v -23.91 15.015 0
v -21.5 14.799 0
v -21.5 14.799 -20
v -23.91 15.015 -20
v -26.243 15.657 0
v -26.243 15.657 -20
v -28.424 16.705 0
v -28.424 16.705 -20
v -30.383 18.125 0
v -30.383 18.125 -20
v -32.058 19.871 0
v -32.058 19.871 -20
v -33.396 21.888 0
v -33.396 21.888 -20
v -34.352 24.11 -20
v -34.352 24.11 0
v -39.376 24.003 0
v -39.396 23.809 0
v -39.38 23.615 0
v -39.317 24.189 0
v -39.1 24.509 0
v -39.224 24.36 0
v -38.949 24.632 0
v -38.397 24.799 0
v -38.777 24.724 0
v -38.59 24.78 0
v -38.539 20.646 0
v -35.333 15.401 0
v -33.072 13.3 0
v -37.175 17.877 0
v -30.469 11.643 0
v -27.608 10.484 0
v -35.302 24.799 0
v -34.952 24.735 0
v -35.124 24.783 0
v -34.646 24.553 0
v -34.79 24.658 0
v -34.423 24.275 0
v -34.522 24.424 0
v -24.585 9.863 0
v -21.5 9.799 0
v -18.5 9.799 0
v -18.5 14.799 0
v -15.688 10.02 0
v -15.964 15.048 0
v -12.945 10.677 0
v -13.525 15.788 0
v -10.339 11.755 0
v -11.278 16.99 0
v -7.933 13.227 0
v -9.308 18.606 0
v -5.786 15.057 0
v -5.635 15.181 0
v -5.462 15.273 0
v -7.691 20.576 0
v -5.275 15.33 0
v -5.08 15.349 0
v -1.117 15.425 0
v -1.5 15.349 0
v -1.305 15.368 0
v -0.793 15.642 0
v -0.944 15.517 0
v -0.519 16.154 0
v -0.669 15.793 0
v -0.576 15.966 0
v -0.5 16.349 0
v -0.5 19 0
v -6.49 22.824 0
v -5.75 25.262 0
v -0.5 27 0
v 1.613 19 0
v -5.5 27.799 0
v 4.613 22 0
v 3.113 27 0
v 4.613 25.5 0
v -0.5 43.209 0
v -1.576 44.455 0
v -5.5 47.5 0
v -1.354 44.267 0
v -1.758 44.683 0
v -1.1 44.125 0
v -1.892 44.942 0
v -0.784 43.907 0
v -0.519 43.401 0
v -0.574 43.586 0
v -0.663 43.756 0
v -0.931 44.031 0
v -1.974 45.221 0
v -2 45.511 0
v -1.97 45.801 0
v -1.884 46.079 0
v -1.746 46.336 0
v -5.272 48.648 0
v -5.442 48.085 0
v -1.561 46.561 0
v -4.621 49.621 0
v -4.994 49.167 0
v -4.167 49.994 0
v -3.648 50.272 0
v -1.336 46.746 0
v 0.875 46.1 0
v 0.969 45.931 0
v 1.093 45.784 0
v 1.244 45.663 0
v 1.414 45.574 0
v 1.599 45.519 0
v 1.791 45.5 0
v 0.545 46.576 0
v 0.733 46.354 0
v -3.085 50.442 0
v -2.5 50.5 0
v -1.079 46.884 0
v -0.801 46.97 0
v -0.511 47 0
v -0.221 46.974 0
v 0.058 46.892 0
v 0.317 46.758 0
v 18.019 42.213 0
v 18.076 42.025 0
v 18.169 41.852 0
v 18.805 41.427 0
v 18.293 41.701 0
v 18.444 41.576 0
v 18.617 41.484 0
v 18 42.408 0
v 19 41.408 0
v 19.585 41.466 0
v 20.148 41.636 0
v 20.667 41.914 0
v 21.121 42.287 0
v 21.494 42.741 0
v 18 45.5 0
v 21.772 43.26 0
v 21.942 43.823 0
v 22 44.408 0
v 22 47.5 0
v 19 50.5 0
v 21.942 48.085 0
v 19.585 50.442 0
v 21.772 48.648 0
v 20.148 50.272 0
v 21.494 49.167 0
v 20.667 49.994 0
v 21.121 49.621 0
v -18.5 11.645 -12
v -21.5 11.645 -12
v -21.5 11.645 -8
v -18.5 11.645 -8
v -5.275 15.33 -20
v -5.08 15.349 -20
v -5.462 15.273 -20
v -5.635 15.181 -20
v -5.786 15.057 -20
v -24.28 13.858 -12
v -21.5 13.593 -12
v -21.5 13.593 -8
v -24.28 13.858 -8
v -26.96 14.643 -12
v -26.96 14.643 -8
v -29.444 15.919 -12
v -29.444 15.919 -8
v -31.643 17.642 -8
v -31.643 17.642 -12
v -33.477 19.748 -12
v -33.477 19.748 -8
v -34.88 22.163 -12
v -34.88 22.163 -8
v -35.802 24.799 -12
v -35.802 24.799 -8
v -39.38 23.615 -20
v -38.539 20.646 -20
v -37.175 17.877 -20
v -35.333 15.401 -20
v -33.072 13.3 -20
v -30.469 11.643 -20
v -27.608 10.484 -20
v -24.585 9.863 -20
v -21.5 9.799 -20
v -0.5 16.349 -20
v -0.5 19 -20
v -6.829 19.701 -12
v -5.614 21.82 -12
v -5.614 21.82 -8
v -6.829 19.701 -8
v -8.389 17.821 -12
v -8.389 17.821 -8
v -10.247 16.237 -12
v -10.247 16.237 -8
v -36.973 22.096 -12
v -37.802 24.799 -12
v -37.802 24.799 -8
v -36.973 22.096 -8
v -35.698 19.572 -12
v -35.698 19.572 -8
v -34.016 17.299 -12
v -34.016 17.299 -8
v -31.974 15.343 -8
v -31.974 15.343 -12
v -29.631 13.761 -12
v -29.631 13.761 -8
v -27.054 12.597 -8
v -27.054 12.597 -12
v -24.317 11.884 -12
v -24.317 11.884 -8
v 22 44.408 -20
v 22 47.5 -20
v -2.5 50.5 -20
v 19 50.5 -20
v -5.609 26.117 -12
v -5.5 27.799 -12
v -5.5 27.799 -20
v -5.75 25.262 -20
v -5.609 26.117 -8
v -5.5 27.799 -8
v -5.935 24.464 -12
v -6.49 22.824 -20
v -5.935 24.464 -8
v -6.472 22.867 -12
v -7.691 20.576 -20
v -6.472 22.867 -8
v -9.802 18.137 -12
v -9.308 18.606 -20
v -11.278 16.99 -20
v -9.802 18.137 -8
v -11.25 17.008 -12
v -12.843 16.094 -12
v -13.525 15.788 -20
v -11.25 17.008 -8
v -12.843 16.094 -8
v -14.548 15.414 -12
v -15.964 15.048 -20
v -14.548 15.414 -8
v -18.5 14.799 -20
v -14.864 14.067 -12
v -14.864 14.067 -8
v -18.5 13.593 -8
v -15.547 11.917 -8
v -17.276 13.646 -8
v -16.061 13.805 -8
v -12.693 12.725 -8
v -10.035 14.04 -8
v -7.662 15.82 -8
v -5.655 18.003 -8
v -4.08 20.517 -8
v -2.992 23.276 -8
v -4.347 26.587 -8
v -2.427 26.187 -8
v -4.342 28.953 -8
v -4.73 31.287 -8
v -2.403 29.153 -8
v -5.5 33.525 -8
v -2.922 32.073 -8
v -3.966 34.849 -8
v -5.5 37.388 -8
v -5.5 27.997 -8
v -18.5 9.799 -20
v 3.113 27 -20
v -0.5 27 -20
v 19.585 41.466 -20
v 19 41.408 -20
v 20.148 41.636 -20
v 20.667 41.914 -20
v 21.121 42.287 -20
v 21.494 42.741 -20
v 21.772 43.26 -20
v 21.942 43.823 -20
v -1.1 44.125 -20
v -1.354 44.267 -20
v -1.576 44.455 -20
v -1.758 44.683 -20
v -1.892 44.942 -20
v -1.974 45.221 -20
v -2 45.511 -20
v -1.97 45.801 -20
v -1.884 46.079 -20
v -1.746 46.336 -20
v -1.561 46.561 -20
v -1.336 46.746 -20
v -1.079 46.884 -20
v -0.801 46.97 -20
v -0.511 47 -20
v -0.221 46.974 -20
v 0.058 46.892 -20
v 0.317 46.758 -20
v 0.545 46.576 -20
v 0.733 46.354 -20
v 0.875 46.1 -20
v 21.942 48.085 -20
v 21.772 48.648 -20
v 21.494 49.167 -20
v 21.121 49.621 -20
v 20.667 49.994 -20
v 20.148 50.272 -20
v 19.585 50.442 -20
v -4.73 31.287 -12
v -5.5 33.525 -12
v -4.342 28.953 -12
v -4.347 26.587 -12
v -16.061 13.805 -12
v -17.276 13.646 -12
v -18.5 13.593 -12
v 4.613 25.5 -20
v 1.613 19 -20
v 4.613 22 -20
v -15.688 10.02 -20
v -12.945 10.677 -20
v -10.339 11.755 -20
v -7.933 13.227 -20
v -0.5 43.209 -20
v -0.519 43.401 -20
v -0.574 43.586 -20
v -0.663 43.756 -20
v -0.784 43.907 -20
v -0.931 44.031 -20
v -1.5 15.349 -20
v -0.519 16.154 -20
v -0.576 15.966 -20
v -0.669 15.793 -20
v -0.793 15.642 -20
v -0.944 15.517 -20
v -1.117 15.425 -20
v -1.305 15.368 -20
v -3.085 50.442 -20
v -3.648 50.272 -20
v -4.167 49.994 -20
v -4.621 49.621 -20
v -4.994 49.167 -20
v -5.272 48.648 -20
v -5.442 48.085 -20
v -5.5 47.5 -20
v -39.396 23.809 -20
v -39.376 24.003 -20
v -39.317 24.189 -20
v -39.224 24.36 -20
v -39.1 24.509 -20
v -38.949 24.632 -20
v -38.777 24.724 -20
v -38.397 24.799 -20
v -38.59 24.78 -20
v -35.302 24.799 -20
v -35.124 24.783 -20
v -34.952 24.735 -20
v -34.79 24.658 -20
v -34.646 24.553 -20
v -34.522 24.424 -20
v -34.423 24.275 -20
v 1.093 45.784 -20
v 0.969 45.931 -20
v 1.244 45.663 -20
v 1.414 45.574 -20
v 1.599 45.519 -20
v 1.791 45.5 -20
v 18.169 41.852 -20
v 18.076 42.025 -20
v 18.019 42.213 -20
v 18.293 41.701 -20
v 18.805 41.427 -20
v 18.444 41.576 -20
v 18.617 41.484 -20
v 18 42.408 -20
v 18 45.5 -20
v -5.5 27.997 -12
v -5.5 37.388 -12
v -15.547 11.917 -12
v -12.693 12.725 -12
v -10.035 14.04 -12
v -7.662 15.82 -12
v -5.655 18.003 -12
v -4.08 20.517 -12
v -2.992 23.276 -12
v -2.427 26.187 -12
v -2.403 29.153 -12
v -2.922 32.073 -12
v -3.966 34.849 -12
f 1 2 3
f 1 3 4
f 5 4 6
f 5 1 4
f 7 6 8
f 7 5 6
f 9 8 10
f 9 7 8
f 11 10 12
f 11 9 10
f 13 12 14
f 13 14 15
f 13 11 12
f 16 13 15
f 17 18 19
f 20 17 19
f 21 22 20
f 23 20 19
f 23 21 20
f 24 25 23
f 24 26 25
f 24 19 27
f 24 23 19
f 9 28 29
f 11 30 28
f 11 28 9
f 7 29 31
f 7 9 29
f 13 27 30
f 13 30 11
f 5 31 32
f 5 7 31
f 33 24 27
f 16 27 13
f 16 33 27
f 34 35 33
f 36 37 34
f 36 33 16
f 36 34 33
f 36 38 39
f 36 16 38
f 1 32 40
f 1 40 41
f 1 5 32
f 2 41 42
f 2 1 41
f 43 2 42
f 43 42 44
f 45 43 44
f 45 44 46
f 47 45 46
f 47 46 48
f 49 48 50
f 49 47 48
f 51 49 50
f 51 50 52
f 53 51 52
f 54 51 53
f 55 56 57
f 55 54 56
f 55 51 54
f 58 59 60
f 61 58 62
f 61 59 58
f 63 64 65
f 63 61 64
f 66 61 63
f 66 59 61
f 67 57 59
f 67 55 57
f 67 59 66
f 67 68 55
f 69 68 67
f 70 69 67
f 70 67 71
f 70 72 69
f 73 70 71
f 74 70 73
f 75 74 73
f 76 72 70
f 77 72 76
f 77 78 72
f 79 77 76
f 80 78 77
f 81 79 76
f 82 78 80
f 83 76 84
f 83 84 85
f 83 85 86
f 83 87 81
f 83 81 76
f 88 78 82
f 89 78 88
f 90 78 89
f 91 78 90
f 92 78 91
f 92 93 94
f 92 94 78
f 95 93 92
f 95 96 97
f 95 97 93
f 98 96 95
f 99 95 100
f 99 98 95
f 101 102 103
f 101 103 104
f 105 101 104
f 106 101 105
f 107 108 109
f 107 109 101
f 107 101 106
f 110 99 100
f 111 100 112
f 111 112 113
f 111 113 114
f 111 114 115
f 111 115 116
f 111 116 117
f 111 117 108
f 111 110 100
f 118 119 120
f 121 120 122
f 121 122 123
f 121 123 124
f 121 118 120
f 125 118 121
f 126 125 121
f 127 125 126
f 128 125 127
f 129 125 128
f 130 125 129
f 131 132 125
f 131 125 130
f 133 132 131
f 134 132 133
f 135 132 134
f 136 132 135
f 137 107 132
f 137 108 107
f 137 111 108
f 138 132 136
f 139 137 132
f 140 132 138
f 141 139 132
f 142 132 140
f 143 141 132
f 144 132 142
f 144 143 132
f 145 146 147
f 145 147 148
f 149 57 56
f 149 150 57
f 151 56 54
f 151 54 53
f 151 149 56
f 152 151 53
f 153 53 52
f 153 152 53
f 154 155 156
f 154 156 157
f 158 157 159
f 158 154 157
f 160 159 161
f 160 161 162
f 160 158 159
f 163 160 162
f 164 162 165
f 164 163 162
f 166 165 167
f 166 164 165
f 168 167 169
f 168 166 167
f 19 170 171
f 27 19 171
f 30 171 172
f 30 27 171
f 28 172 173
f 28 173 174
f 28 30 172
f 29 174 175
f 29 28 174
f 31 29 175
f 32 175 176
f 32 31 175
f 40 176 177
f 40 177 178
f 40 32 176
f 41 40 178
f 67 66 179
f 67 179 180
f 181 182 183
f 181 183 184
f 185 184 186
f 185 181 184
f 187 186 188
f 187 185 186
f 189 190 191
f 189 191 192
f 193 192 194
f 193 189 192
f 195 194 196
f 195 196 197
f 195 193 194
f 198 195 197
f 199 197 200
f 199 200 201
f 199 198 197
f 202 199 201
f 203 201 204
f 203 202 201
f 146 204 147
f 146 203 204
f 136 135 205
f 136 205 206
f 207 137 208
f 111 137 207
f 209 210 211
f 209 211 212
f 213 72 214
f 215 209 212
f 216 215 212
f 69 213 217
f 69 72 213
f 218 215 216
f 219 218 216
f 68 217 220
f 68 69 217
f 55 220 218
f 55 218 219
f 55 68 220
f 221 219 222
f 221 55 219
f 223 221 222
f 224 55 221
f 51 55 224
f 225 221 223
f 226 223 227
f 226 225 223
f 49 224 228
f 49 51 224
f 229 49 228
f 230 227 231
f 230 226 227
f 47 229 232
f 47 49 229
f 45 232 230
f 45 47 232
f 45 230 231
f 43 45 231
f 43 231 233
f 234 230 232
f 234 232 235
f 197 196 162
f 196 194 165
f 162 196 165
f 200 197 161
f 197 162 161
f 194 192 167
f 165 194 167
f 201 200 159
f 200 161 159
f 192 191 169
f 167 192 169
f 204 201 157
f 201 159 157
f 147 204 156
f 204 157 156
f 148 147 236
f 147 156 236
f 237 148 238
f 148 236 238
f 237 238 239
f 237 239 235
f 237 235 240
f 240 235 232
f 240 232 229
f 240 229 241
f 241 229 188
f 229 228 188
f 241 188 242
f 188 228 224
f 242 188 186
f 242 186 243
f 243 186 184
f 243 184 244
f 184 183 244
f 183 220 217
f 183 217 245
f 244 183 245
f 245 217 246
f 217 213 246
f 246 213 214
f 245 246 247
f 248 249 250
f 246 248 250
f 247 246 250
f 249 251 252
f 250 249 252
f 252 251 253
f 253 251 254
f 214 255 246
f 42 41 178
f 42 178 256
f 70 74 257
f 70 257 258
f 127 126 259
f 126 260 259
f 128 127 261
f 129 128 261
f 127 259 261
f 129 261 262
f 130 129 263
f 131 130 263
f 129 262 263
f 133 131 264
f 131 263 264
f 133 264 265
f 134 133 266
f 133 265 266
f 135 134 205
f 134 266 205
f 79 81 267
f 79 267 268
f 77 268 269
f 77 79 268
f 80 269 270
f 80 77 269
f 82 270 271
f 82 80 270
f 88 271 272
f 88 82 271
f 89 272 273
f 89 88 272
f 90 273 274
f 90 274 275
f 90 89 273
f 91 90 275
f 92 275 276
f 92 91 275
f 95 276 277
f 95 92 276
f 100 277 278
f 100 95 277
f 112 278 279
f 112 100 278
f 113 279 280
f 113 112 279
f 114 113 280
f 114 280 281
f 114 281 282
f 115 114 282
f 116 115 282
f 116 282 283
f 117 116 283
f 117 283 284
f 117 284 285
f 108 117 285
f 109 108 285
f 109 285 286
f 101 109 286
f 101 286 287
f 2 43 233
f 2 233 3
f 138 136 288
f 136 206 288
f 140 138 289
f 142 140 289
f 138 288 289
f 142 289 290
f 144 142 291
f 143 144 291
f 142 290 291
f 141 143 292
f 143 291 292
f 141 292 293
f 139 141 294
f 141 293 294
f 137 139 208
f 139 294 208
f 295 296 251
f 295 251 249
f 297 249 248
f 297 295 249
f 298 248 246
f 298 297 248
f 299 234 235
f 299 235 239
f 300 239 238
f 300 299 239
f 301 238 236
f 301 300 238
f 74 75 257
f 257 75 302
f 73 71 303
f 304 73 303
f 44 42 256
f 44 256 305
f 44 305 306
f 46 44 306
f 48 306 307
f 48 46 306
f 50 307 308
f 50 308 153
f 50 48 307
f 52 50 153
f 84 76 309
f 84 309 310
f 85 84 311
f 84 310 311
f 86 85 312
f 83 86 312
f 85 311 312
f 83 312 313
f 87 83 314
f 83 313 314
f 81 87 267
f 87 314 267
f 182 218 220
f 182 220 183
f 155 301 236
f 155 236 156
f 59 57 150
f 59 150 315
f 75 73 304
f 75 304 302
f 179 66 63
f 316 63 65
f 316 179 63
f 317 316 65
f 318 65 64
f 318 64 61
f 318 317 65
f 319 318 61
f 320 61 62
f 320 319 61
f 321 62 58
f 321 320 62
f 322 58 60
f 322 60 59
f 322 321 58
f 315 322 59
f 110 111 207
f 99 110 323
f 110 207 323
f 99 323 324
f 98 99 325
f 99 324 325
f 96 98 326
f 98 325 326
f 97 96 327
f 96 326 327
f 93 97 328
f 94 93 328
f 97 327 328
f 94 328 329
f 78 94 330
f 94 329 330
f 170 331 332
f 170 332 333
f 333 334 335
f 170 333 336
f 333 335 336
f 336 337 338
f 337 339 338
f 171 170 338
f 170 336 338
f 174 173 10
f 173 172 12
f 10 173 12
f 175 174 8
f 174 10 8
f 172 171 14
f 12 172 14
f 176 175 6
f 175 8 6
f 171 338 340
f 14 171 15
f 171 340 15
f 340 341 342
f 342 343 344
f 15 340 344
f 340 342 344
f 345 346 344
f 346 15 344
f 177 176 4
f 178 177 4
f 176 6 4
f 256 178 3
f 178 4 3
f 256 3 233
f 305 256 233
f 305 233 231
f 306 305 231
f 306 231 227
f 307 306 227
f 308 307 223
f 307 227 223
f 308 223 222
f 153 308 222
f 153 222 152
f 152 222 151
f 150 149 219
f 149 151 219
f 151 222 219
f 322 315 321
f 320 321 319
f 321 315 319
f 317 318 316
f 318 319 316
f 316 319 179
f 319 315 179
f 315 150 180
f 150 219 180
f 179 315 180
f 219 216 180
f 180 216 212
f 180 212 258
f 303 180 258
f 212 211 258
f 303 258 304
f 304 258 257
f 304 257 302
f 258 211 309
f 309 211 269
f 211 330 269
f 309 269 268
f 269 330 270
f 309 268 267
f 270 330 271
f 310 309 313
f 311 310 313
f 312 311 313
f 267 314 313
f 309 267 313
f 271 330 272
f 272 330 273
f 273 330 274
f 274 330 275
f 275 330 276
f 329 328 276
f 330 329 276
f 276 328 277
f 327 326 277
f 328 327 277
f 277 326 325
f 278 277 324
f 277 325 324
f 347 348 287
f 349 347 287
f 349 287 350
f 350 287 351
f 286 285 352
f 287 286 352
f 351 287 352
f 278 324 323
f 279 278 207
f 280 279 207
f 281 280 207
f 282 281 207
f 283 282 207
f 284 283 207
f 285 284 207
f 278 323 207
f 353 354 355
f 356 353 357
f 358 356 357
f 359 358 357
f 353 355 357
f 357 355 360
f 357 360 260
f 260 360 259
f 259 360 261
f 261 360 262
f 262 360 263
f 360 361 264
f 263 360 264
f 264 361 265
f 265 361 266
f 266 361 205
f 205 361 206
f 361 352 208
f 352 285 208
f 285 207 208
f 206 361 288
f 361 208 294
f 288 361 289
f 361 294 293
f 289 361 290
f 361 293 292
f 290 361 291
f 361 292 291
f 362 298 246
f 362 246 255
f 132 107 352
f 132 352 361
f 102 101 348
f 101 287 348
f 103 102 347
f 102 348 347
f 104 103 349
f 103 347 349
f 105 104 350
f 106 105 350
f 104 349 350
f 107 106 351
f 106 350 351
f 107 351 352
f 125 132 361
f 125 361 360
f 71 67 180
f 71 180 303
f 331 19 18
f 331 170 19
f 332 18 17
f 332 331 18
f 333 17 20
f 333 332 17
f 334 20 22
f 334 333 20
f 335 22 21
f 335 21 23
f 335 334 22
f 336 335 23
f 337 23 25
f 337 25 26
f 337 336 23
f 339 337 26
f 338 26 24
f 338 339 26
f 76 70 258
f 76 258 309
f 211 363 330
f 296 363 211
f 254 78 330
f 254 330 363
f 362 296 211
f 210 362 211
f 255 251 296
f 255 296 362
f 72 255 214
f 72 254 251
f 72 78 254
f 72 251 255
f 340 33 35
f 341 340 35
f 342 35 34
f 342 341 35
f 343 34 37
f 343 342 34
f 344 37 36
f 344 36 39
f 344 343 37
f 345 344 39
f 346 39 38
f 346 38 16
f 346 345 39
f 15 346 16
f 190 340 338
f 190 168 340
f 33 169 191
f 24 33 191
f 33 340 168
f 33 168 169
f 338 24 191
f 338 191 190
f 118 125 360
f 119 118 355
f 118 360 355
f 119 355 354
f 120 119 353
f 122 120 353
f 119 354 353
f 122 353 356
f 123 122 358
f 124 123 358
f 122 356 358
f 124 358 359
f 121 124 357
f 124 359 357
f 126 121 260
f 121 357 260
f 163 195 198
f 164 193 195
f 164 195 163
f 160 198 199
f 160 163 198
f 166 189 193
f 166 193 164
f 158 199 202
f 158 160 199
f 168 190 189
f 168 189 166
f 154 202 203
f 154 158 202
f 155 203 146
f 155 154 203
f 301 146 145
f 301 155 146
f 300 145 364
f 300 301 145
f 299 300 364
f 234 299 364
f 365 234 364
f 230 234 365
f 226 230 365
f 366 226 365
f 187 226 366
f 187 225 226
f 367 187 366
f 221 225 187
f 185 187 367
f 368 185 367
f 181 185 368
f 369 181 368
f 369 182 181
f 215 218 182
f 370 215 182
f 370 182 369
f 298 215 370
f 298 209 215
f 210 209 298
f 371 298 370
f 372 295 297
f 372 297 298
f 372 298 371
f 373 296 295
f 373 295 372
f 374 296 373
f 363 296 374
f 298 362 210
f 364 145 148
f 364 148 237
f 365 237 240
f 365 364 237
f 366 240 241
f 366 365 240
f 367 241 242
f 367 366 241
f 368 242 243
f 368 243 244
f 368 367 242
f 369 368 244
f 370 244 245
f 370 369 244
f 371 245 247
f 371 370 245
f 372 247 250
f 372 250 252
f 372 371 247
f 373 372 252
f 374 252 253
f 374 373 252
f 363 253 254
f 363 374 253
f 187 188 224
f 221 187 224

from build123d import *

# Parameters (mm, degrees)
BOSS_EXTRUDE1_DEPTH     = 20
FILLET1_R               = 3
CHAMFER1_SIZE           = 3
FILLET2_R               = 1
CUT_EXTRUDE1_DEPTH      = 2
CUT_EXTRUDE1_DEPTH_BACK = 2
CUT_EXTRUDE1_START      = -10
CHAMFER2_SIZE           = 1.5


with BuildPart() as part:
    # Sketch1 → Boss-Extrude1 (new body)
    with BuildSketch(Plane.XY):
        with BuildLine():
            Line((18, 45.5), (18, 41.407980081))
            Line((18, 41.407980081), (22, 41.407980081))
            Line((22, 41.407980081), (22, 50.5))
            Line((22, 50.5), (-5.5, 50.5))
            Line((-5.5, 50.5), (-5.5, 27.798635693))
            ThreePointArc((-5.5, 27.798635693), (-9.307611845, 18.606247538), (-18.5, 14.798635693))
            Line((-18.5, 14.798635693), (-21.5, 14.798635693))
            ThreePointArc((-21.5, 14.798635693), (-29.723519433, 17.585816031), (-34.557759664, 24.798635693))
            Line((-34.557759664, 24.798635693), (-39.557759664, 24.798635693))
            ThreePointArc((-39.557759664, 24.798635693), (-33.539294452, 13.674546113), (-21.5, 9.798635693))
            Line((-21.5, 9.798635693), (-18.5, 9.798635693))
            ThreePointArc((-18.5, 9.798635693), (-11.432404679, 11.244207392), (-5.5, 15.348736095))
            Line((-5.5, 15.348736095), (-0.5, 15.348736095))
            Line((-0.5, 15.348736095), (-0.5, 19))
            Line((-0.5, 19), (4.612884421, 19))
            Line((4.612884421, 19), (4.612884421, 27))
            Line((4.612884421, 27), (-0.5, 27))
            Line((-0.5, 27), (-0.5, 44))
            ThreePointArc((-0.5, 44), (-1.560660172, 46.560660172), (1, 45.5))
            Line((1, 45.5), (18, 45.5))
        make_face()
    extrude(amount=-BOSS_EXTRUDE1_DEPTH)

    # Fillet1
    fillet1_edges = [part.edges().sort_by_distance(p)[0] for p in [
        (-5.5, 50.5, -10),
        (22, 50.5, -10),
        (22, 41.407980081, -10),
    ]]
    fillet(fillet1_edges, radius=FILLET1_R)

    # Chamfer1
    chamfer1_edges = [part.edges().sort_by_distance(p)[0] for p in [
        (4.612884421, 19, -10),
    ]]
    chamfer(chamfer1_edges, length=CHAMFER1_SIZE)

    # Fillet2
    fillet2_edges = [part.edges().sort_by_distance(p)[0] for p in [
        (18, 41.407980081, -10),
        (-0.5, 15.348736095, -10),
        (-5.5, 15.348736095, -10),
        (-34.557759664, 24.798635693, -10),
        (-39.557759664, 24.798635693, -10),
        (-0.5, 44, -10),
        (1, 45.5, -10),
    ]]
    fillet(fillet2_edges, radius=FILLET2_R - 0.0001)  # a hair under: the kernel refuses the full size

    # Sketch3 → Cut-Extrude1 (cut, two sides: drawn at the far end of the back side and taken through both)
    with BuildSketch(Plane.XY.offset(CUT_EXTRUDE1_START - CUT_EXTRUDE1_DEPTH_BACK)):
        with BuildLine():
            Line((-18.5, 13.593483966), (-21.5, 13.593483966))
            ThreePointArc((-21.5, 13.593483966), (-30.584504262, 16.728345827), (-35.80235804, 24.798635693))
            Line((-35.80235804, 24.798635693), (-37.80235804, 24.798635693))
            ThreePointArc((-37.80235804, 24.798635693), (-31.973681851, 15.343278195), (-21.5, 11.644732532))
            Line((-21.5, 11.644732532), (-18.5, 11.644732532))
            ThreePointArc((-18.5, 11.644732532), (-4.080428513, 20.516840208), (-5.5, 37.387618296))
            Line((-5.5, 37.387618296), (-5.5, 33.524571041))
            ThreePointArc((-5.5, 33.524571041), (-4.487181784, 30.128284006), (-4.346617542, 26.586983672))
            ThreePointArc((-4.346617542, 26.586983672), (-4.771973785, 24.147932767), (-5.614362182, 21.819783493))
            ThreePointArc((-5.614362182, 21.819783493), (-7.568289903, 18.727580078), (-10.247050758, 16.236838064))
            ThreePointArc((-10.247050758, 16.236838064), (-12.457076385, 14.94292063), (-14.8635084, 14.066838125))
            ThreePointArc((-14.8635084, 14.066838125), (-16.666415033, 13.712319575), (-18.5, 13.593483966))
        make_face()
        with BuildLine():
            Line((-6.471563344, 22.867437906), (-5.614362182, 21.819783493))
            ThreePointArc((-5.614362182, 21.819783493), (-4.771973785, 24.147932767), (-4.346617542, 26.586983672))
            Line((-4.346617542, 26.586983672), (-5.5, 27.996625043))
            Line((-5.5, 27.996625043), (-5.5, 27.798635693))
            ThreePointArc((-5.5, 27.798635693), (-5.745203323, 25.285637139), (-6.471563344, 22.867437906))
        make_face()
        with BuildLine():
            Line((-14.54802471, 15.413891396), (-14.8635084, 14.066838125))
            ThreePointArc((-14.8635084, 14.066838125), (-12.457076385, 14.94292063), (-10.247050758, 16.236838064))
            Line((-10.247050758, 16.236838064), (-9.8019978, 18.137126612))
            ThreePointArc((-9.8019978, 18.137126612), (-12.030109342, 16.522975408), (-14.54802471, 15.413891396))
        make_face()
    extrude(amount=CUT_EXTRUDE1_DEPTH + CUT_EXTRUDE1_DEPTH_BACK, mode=Mode.SUBTRACT)

    # Chamfer2
    chamfer2_edges = [part.edges().sort_by_distance(p)[0] for p in [
        (4.612884421, 27, -10),
    ]]
    chamfer(chamfer2_edges, length=CHAMFER2_SIZE)


solid = part.part
